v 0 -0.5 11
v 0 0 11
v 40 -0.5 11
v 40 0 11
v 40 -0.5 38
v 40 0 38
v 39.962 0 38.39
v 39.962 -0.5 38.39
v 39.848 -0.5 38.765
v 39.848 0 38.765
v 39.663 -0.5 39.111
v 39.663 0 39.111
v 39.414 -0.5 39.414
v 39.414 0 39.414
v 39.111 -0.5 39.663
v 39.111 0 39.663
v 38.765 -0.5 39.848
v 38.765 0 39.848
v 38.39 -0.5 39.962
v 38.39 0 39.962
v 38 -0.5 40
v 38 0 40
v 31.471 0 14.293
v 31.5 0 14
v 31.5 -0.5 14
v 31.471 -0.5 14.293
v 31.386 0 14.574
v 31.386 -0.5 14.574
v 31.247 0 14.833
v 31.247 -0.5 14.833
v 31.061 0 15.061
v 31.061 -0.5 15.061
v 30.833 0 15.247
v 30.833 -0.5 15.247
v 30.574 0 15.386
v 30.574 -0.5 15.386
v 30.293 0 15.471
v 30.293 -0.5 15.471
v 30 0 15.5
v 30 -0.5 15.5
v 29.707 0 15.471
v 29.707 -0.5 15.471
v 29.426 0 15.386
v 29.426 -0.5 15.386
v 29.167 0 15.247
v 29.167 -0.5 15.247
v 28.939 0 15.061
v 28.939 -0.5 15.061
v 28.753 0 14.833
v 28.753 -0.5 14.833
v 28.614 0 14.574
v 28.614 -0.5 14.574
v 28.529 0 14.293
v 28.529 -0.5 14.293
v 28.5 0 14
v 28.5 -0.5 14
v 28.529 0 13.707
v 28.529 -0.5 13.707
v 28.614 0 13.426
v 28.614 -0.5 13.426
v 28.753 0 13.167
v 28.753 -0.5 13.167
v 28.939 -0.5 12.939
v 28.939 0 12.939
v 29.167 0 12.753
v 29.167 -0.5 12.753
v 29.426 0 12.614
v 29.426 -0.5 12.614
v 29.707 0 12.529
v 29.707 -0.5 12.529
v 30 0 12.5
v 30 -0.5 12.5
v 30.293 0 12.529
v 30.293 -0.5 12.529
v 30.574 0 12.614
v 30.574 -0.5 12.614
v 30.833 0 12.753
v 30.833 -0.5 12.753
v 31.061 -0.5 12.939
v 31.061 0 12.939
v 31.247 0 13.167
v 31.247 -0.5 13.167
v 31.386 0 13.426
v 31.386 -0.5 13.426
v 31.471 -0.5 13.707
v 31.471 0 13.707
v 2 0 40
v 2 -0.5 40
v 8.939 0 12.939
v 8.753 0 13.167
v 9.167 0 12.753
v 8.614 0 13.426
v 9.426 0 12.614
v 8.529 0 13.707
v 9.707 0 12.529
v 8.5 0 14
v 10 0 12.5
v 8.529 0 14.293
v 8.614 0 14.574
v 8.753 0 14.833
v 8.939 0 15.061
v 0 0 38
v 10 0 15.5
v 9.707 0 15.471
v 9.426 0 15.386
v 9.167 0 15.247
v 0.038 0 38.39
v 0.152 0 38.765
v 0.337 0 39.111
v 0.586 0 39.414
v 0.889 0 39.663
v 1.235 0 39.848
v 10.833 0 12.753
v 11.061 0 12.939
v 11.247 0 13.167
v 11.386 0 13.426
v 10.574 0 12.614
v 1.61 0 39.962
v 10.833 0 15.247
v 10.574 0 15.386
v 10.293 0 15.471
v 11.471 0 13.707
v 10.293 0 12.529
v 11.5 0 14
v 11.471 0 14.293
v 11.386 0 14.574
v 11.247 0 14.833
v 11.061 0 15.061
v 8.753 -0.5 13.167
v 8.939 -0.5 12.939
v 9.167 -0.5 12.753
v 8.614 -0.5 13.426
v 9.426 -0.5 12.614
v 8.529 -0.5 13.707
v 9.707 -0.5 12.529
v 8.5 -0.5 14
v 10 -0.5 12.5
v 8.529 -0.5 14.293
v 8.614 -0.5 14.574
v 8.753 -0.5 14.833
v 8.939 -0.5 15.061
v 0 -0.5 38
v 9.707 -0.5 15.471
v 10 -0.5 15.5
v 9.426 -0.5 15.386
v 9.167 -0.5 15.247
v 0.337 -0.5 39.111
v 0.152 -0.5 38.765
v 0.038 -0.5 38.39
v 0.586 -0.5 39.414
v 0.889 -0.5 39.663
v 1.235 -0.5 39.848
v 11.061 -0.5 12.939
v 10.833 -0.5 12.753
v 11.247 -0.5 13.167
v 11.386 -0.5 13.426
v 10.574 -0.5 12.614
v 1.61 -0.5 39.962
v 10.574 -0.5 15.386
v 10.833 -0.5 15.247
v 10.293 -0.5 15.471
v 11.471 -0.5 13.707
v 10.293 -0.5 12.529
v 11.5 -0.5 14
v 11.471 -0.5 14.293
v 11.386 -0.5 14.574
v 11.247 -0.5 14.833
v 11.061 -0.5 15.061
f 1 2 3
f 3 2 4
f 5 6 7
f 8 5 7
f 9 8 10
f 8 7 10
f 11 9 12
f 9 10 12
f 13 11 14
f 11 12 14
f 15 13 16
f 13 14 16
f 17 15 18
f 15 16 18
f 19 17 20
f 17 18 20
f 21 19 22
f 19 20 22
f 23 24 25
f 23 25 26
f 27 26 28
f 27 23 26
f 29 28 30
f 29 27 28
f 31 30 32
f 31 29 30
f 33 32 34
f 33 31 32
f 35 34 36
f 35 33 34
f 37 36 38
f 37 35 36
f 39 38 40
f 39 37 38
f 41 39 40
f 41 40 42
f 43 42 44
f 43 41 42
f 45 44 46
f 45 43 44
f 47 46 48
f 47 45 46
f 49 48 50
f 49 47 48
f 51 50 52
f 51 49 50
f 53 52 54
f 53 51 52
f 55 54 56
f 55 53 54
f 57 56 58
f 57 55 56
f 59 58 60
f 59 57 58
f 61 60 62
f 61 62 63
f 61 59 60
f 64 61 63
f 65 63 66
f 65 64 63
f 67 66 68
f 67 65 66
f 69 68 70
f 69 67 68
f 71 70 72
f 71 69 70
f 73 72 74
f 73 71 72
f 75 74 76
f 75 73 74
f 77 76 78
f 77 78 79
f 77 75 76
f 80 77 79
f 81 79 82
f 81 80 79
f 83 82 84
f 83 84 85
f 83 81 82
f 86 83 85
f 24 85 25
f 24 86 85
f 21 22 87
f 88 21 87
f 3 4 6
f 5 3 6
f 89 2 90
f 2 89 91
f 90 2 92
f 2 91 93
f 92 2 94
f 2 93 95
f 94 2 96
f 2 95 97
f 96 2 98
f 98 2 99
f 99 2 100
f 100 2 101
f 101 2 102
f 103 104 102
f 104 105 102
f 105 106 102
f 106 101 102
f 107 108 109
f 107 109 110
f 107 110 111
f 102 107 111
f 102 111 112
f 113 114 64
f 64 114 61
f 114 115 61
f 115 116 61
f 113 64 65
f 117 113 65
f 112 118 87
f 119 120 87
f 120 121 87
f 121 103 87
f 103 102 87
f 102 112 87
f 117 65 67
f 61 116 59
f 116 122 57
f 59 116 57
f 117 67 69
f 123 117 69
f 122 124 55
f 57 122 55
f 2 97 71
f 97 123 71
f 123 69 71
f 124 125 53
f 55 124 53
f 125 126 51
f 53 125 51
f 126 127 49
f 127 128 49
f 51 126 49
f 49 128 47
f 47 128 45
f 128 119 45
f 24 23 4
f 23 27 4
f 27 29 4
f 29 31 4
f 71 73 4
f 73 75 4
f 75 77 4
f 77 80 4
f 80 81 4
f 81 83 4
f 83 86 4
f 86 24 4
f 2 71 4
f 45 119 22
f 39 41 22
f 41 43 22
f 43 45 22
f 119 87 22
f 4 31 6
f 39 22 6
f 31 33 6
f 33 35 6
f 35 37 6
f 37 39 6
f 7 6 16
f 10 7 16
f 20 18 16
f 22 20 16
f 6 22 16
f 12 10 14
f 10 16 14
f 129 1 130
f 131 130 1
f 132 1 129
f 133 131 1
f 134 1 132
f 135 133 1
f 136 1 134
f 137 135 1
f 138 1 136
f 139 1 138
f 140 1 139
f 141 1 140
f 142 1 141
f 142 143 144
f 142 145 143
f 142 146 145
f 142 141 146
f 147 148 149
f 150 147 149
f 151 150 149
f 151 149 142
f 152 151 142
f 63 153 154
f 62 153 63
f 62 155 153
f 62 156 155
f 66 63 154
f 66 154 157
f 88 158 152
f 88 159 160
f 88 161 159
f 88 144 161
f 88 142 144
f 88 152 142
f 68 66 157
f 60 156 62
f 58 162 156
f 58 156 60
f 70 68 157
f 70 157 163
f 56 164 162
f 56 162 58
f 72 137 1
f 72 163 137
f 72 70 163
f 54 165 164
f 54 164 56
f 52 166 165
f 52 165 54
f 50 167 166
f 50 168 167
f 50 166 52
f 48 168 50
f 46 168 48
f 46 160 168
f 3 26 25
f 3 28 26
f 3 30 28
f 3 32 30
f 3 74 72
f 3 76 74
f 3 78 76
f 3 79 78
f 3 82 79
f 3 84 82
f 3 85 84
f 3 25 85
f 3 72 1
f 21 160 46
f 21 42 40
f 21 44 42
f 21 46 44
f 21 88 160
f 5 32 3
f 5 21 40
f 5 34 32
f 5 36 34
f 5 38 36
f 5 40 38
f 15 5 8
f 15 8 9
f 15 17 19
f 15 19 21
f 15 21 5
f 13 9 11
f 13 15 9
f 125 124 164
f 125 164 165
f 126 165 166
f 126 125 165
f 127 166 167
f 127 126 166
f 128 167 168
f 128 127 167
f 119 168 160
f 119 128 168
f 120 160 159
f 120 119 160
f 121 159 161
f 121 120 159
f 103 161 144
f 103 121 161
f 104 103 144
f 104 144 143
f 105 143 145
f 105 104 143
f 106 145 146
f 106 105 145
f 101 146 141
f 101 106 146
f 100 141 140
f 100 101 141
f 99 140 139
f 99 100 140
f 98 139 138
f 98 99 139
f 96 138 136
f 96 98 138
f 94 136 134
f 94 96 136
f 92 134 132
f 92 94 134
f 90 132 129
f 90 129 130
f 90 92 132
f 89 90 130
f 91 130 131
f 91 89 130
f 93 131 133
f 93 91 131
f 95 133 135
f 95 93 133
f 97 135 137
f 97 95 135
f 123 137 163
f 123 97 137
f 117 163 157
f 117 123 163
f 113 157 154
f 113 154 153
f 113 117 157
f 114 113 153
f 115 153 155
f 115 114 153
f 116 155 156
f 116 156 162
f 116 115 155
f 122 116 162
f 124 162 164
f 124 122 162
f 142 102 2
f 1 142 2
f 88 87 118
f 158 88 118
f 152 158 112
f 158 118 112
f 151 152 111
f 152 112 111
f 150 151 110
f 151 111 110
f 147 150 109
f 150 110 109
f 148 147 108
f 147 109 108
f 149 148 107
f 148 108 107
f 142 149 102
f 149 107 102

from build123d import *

# Parameters (mm, degrees)
F0_R     = 1.5
F1_DEPTH = 0.5


with BuildPart() as f1:
    # F0 (on Front) → F1 (new body)
    with BuildSketch(Plane.XZ):
        with BuildLine():
            Line((38, 40), (2, 40))
            ThreePointArc((2, 40), (0.585786, 39.414214), (0, 38))
            Line((0, 38), (0, 11))
            Line((0, 11), (40, 11))
            Line((40, 11), (40, 38))
            ThreePointArc((40, 38), (39.414214, 39.414214), (38, 40))
        make_face()
        with Locations((10, 14)):
            Circle(F0_R, mode=Mode.SUBTRACT)
        with Locations((30, 14)):
            Circle(F0_R, mode=Mode.SUBTRACT)
    extrude(amount=F1_DEPTH)


solid = f1.part
